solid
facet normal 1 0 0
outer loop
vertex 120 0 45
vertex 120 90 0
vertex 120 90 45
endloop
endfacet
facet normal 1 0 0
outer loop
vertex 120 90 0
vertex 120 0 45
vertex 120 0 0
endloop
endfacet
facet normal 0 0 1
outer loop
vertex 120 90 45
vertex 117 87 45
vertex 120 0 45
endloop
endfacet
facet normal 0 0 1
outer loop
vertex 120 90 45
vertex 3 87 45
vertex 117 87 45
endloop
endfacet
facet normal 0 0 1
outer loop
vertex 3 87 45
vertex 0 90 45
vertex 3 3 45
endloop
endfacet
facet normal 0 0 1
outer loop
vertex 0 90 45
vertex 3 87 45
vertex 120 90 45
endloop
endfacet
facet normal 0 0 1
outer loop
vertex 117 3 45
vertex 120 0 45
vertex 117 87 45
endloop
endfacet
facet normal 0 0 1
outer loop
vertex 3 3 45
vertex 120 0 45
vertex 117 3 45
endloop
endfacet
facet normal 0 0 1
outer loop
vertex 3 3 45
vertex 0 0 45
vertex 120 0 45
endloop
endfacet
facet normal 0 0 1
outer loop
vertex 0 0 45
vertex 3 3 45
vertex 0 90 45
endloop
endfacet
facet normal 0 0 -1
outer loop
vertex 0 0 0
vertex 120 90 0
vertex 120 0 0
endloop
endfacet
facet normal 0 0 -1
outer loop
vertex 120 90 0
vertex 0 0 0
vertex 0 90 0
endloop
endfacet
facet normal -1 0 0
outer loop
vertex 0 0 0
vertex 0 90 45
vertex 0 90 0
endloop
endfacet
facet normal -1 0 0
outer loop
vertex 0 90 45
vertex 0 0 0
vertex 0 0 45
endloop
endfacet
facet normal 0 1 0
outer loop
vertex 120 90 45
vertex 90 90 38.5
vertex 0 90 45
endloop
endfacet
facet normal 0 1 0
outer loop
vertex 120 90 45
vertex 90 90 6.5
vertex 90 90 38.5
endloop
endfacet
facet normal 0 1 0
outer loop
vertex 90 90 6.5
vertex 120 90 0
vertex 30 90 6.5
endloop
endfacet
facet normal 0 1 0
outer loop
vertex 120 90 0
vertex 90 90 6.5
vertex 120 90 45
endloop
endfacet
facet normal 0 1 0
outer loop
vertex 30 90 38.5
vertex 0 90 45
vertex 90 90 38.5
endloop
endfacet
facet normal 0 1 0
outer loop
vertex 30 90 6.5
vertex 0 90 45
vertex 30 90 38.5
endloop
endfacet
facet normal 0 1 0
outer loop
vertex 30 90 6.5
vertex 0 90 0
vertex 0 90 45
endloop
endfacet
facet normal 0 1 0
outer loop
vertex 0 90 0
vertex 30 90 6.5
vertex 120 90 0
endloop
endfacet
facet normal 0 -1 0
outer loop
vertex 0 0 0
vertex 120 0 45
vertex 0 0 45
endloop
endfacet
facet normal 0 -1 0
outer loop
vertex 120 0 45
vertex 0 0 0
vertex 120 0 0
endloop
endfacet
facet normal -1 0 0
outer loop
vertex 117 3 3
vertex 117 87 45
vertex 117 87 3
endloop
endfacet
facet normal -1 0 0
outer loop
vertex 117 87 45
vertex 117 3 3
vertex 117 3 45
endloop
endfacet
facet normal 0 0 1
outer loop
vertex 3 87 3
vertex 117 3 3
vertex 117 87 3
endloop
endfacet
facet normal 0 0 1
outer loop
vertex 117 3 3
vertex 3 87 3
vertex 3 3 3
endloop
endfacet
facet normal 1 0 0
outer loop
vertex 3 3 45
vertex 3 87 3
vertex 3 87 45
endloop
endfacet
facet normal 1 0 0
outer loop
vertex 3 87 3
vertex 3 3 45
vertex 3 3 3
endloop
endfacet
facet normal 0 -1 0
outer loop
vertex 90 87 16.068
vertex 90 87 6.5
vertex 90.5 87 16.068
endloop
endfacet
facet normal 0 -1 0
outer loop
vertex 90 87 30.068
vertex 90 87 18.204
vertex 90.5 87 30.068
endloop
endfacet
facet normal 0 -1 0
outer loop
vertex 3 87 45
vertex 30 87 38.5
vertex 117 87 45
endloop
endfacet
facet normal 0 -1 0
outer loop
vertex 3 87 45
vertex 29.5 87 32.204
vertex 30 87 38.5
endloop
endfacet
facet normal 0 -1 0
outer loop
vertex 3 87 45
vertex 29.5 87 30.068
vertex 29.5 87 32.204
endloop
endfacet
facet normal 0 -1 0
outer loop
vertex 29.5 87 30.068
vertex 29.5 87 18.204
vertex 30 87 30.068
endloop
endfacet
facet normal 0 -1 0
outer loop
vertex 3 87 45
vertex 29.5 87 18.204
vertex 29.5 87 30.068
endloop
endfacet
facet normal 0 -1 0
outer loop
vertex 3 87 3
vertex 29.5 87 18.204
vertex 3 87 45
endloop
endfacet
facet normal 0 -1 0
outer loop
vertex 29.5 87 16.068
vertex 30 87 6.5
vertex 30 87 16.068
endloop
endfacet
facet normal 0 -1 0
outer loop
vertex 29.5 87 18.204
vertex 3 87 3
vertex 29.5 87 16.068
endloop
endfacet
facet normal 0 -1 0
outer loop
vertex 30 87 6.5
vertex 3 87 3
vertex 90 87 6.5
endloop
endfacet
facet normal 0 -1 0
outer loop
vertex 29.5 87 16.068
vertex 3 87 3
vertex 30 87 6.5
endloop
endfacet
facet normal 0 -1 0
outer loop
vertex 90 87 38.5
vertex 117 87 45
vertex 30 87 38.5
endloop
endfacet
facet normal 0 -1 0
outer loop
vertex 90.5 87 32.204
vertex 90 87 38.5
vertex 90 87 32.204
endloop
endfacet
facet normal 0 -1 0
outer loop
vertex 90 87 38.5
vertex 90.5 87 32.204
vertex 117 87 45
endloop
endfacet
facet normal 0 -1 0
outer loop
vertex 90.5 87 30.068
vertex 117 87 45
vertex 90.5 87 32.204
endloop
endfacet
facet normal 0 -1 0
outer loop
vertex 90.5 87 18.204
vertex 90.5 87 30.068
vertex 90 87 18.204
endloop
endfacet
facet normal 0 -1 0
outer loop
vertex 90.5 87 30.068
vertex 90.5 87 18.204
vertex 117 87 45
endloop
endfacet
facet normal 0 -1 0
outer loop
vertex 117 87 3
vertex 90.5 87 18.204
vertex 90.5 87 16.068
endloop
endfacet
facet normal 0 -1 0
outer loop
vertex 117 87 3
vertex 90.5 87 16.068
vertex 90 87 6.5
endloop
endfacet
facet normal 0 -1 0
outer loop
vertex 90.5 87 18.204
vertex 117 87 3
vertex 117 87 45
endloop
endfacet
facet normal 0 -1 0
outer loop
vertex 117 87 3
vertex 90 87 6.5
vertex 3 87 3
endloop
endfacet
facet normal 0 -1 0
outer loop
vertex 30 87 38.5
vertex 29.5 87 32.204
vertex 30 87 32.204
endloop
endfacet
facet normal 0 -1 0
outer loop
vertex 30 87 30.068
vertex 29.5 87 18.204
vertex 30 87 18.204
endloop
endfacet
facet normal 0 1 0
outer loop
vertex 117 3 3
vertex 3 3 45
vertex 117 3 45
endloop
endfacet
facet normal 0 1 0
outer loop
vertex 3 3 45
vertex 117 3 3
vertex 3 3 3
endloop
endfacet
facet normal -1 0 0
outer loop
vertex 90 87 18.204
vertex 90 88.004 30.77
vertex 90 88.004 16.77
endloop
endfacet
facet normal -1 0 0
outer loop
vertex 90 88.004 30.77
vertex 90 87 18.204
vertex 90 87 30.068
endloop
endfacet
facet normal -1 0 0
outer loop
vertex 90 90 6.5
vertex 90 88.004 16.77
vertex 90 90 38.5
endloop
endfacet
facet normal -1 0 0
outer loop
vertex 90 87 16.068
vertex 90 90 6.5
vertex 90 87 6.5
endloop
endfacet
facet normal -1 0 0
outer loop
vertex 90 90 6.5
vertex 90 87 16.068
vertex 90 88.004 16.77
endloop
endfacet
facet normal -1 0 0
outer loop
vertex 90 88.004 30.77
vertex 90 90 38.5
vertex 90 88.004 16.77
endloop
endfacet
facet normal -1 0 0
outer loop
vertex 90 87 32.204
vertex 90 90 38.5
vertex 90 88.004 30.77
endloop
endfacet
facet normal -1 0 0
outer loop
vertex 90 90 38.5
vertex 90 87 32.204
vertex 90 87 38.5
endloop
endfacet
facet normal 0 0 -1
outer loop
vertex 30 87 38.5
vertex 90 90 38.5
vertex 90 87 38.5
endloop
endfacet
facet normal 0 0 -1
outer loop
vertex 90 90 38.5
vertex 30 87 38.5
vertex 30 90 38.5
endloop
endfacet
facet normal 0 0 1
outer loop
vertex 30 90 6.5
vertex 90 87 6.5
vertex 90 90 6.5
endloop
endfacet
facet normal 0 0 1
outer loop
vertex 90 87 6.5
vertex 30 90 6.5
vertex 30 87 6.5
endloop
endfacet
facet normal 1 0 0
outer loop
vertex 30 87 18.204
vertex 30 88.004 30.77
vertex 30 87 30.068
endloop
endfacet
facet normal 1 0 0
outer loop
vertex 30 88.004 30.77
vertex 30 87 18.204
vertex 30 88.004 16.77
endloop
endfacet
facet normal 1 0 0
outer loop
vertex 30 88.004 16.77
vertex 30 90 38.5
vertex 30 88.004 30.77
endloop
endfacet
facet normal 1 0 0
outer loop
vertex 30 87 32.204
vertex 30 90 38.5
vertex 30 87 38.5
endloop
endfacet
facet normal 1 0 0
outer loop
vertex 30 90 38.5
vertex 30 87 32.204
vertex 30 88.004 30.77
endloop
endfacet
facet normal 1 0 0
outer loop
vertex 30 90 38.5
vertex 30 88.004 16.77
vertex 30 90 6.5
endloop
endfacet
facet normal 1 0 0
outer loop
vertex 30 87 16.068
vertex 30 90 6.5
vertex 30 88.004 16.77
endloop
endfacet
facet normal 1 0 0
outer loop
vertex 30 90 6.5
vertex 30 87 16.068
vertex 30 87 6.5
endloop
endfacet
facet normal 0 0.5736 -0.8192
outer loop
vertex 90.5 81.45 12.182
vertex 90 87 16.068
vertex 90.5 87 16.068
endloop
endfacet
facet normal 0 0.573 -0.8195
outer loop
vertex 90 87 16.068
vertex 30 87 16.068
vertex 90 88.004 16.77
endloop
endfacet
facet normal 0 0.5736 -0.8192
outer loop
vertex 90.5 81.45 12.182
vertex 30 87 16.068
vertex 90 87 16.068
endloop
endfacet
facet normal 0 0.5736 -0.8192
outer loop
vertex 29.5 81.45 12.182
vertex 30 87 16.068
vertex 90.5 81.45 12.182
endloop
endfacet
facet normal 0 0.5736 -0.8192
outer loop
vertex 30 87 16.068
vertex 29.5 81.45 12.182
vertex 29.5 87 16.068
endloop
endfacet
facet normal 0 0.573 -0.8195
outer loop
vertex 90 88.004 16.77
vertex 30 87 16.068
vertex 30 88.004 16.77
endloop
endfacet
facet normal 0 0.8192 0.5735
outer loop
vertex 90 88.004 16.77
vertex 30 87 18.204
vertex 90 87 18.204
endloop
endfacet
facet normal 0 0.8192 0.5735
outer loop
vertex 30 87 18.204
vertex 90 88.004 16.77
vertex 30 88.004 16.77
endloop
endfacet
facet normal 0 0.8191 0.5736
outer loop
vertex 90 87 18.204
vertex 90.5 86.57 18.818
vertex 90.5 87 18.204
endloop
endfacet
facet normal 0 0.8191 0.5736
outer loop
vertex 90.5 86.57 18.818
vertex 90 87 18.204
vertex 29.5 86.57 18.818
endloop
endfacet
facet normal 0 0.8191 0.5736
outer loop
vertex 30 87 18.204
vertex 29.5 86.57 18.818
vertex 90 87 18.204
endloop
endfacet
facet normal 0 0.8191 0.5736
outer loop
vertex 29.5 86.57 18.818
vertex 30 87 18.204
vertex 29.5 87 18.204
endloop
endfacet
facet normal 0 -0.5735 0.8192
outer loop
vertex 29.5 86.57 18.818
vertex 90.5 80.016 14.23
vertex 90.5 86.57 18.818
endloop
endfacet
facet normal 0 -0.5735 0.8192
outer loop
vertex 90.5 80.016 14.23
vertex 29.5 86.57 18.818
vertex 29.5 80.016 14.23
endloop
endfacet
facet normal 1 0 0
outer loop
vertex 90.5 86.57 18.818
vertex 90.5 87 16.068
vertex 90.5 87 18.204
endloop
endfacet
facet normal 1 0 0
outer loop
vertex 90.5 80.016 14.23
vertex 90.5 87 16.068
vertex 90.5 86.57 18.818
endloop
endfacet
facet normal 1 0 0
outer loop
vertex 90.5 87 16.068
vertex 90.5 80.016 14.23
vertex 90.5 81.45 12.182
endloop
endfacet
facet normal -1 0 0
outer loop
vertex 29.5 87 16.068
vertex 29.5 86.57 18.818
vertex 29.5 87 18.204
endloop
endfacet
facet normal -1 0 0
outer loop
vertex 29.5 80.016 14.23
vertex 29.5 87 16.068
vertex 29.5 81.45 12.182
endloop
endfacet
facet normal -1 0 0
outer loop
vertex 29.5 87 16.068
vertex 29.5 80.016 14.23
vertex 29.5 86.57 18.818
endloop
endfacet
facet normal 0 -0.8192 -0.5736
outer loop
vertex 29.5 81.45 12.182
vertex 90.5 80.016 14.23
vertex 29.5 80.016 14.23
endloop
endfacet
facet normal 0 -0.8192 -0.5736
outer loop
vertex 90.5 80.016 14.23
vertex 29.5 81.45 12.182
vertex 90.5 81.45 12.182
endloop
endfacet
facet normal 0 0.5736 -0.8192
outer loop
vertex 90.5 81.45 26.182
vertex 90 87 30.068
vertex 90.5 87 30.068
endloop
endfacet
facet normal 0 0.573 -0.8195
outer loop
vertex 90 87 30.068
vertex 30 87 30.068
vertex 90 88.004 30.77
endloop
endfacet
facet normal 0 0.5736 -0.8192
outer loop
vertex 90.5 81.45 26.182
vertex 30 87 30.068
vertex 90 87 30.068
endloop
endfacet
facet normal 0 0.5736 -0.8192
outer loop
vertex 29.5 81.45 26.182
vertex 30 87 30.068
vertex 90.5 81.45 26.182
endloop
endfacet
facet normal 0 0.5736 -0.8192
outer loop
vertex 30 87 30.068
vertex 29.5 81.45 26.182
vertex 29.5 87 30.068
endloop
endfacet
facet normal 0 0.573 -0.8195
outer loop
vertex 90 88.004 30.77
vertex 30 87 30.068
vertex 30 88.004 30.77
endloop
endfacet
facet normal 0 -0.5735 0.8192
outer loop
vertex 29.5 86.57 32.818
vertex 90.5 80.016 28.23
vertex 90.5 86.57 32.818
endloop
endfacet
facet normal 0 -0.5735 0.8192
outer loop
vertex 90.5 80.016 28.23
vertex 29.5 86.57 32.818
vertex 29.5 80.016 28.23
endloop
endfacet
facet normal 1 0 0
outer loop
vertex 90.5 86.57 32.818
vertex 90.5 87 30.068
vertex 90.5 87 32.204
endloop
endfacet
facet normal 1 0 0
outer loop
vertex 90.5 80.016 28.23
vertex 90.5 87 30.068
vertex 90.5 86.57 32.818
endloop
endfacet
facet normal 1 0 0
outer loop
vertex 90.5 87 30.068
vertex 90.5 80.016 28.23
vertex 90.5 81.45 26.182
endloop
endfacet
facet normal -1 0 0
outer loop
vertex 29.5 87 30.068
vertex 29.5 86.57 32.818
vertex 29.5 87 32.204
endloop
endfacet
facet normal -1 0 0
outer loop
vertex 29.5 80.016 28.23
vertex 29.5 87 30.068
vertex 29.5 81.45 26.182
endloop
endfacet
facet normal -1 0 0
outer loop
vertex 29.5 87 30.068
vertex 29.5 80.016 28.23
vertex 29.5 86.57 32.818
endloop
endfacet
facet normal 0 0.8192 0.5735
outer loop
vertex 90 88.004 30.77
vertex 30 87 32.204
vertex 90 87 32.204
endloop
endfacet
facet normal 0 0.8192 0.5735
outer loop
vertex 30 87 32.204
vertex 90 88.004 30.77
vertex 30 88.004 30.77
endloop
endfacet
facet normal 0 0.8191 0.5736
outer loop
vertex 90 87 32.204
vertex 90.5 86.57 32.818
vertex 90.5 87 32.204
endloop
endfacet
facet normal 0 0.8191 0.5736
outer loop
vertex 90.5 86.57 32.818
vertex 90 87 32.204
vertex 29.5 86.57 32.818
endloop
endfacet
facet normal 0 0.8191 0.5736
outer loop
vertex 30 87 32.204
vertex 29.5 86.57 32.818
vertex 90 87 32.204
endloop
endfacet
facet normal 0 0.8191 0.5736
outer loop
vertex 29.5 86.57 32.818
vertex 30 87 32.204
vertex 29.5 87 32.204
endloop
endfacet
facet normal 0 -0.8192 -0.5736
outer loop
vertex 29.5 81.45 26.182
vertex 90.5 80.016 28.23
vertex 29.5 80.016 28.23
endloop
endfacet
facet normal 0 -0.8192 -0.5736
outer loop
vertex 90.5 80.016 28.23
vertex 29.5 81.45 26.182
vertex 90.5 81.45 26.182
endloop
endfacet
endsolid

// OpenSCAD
$fn = 32;

// ----------------------------------------------------------------------
// Vent box: louvers enclosure
// ----------------------------------------------------------------------

// --- parameters (mm) ---
box_l = 120;              // box length, X
box_w = 90;               // box width, Y
box_h = 45;               // box height, Z
wall_t = 3;               // shell wall thickness
win_l = 60;               // vent window width, X
win_h = 32;               // vent window height, Z
slat_t = 2.5;             // louver slat thickness
slat_d = 8;               // louver slat depth
slat_a = 35;              // louver slat angle, degrees
slat_pitch = 14;          // louver pitch
slat_yc = 84.01;          // slat centreline Y

win_z0 = (box_h - win_h) / 2;  // window lower edge Z
n_slats = 2;  // louver count
slat_z0 = win_z0 + (win_h - (n_slats - 1) * slat_pitch) / 2;

difference() {
  union() {
    difference() {
      cube([box_l, box_w, box_h]);
  translate([wall_t, wall_t, wall_t])
    cube([box_l - 2 * wall_t, box_w - 2 * wall_t, box_h]);
  translate([(box_l - win_l) / 2, box_w - wall_t - 1, win_z0])
    cube([win_l, wall_t + 2, win_h]);
    }
    for (i = [0 : n_slats - 1])
      translate([box_l / 2, slat_yc, slat_z0 + i * slat_pitch])
        rotate([slat_a, 0, 0])
          cube([win_l + 1, slat_d, slat_t], center = true);
  }
}
